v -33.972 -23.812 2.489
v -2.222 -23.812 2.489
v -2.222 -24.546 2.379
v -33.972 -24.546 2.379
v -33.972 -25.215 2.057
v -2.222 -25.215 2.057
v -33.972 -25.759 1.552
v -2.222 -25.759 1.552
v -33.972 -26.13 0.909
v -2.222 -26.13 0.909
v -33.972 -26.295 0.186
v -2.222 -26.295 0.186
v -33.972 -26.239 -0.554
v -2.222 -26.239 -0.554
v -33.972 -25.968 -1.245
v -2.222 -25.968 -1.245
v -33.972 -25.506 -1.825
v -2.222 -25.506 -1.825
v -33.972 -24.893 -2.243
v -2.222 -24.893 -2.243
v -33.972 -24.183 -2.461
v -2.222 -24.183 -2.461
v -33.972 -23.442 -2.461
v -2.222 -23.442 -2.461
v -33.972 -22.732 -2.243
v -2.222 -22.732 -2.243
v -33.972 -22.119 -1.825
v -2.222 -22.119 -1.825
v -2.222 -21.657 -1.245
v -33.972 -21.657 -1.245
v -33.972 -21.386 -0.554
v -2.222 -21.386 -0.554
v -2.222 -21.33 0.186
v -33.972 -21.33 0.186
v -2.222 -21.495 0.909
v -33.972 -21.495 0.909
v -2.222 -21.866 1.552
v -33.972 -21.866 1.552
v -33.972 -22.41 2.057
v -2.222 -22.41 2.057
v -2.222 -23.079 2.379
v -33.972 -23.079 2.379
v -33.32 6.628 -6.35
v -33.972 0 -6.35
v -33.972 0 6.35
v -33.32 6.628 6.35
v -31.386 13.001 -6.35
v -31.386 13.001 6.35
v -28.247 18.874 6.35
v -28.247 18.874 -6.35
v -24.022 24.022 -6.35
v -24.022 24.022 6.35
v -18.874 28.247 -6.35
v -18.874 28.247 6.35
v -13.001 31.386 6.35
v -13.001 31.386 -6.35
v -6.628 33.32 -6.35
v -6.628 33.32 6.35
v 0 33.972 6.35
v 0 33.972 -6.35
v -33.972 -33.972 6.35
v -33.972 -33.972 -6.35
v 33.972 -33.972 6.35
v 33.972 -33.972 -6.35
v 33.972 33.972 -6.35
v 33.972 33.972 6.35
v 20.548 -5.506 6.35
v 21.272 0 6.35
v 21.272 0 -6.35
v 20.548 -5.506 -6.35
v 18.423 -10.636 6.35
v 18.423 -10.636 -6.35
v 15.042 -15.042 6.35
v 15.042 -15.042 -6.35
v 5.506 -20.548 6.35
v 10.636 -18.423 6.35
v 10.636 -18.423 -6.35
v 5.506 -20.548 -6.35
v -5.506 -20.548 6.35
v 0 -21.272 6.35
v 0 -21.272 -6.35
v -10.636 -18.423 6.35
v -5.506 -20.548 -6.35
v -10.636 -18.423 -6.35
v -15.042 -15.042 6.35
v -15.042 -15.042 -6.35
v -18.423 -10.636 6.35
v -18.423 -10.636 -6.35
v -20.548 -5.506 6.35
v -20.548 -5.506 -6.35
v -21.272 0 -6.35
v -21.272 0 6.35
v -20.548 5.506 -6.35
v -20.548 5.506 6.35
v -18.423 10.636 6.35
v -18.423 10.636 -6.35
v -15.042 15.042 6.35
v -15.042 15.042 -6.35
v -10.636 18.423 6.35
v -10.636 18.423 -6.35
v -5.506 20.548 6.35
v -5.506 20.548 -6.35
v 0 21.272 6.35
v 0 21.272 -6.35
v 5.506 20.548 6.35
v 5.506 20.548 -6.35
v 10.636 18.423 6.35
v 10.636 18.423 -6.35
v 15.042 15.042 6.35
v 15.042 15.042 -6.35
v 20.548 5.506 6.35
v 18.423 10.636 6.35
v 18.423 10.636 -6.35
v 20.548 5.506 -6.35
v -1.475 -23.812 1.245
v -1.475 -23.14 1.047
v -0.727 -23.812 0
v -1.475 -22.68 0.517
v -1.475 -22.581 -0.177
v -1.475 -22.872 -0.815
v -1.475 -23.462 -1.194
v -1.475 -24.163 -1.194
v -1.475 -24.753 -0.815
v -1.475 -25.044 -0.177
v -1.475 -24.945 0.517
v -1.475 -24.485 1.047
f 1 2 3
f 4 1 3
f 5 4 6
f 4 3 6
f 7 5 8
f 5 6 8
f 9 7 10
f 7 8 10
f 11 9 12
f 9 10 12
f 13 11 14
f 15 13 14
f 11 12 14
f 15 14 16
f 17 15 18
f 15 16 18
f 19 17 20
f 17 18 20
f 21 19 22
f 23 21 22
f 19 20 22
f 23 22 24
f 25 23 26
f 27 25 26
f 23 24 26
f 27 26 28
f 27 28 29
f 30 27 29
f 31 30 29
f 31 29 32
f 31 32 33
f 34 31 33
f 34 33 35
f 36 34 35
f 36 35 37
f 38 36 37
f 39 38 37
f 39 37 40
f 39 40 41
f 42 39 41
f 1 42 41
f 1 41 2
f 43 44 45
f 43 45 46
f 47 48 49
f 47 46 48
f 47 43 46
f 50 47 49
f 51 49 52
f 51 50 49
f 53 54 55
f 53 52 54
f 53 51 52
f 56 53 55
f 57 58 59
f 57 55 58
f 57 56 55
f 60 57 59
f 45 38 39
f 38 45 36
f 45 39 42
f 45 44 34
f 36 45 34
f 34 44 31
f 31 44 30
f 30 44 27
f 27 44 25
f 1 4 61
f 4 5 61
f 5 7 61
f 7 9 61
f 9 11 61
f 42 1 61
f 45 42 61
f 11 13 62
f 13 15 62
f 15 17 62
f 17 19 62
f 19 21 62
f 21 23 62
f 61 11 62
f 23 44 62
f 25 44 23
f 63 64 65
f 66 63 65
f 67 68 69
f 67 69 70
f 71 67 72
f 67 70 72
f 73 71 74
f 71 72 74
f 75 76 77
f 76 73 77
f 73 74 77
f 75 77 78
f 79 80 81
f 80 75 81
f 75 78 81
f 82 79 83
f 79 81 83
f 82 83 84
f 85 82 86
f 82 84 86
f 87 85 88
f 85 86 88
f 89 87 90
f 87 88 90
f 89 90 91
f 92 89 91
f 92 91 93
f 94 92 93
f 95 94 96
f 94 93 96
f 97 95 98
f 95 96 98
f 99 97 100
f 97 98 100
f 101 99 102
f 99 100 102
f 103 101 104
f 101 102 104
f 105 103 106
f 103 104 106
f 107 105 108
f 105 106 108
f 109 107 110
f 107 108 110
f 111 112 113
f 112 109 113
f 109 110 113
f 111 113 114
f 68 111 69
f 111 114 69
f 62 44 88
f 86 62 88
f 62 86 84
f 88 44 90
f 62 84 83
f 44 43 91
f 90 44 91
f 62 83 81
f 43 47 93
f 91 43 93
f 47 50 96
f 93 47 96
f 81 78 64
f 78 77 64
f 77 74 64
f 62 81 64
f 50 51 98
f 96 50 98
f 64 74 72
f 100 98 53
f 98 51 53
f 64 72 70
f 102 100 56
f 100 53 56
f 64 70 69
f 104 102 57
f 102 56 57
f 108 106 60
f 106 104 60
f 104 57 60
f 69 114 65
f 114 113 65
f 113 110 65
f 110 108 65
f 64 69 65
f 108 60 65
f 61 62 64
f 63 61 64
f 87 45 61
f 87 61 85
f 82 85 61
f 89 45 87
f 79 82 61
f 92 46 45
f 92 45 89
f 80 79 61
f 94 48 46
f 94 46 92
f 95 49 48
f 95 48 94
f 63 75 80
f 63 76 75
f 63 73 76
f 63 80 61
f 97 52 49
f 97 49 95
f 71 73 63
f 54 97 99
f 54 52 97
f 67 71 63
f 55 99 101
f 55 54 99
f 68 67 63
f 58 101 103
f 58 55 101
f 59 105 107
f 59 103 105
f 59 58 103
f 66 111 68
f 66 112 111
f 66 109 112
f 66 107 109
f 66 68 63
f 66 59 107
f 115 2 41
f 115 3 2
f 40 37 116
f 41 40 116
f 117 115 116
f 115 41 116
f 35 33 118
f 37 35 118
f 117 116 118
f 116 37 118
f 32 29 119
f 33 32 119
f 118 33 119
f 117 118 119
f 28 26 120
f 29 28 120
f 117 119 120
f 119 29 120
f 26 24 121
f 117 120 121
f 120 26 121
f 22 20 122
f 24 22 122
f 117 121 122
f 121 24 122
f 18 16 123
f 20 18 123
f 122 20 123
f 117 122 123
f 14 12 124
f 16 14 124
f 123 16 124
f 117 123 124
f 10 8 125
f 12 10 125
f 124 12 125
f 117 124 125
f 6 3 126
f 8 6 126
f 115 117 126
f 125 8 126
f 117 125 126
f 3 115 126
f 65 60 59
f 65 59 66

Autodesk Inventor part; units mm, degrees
ref_plane "XZ Plane" through (0, 0, 0) normal (0, 1, 0) x (-1, 0, 0)
ref_plane "XY Plane" through (0, 0, 0) normal (0, 0, 1) x (1, 0, 0)
sketch "Sketch1" plane through (0, 0, 0) normal (0, 0, 1) x (1, 0, 0)
  circle A0 centre (0, 0) radius 21.2725
  arc A1 (0, 33.9725) -> (-33.9725, 0) centre (0, 0) ccw
  line L0 (0, -33.9725) -> (-33.9725, -33.9725)
  line L1 (-33.9725, 0) -> (-33.9725, -33.9725)
  line L2 (0, 33.9725) -> (33.9725, 33.9725)
  line L3 (0, -33.9725) -> (33.9725, -33.9725)
  line L4 (33.9725, 0) -> (33.9725, -33.9725)
  line L5 (33.9725, 0) -> (33.9725, 33.9725)
  dimension "d0" = 42.545
  dimension "d1" = 67.945
extrude "Extrusion1" add sketch "Sketch1" along normal mid plane 12.7
sketch "Sketch2" plane through (-33.9725, -33.9725, 6.35) normal (-1, 0, 0) x (0, 0, 1)
  line L0 (0, 0) -> (-12.7, 0) construction
  line L1 (-6.35, 0) -> (-6.35, 33.9725) construction
  point P0 (-6.35, 10.16)
  dimension "d4" = 10.16
hole "Hole1" at (-33.9725, -23.8125, 0) direction (1, 0, 0) diameter 4.9784 depth 31.75 tip angle 118 thread size "1/4-20 UNC" class "2B" standard "ANSI Unified Screw Threads"
ref_plane "Work Plane1" through (-9.525, 0, 0) normal (1, 0, 0) x (0, 1, 0)
sketch "Sketch3" plane through (33.9725, -33.9725, 6.35) normal (1, 0, 0) x (0, 0, -1)
  line L0 (0, 67.945) -> (12.7, 67.945) construction
  line L1 (6.35, 67.945) -> (6.35, 0) construction
  line L2 (0, 0) -> (12.7, 0) construction
  point P0 (6.35, 33.9725)
  point P1 (6.35, 61.595)
  point P2 (6.35, 6.35)
  dimension "d13" = 6.35
  dimension "d14" = 6.35
equation "\"d0\" = pipeDiameter"
equation "\"d1\" = pipeDiameter + 2 * outerRadius"
equation "\"pipeDiameter\" = 42.545"
equation "\"outerRadius\" = 12.7"
properties part number "gripperBracket"
